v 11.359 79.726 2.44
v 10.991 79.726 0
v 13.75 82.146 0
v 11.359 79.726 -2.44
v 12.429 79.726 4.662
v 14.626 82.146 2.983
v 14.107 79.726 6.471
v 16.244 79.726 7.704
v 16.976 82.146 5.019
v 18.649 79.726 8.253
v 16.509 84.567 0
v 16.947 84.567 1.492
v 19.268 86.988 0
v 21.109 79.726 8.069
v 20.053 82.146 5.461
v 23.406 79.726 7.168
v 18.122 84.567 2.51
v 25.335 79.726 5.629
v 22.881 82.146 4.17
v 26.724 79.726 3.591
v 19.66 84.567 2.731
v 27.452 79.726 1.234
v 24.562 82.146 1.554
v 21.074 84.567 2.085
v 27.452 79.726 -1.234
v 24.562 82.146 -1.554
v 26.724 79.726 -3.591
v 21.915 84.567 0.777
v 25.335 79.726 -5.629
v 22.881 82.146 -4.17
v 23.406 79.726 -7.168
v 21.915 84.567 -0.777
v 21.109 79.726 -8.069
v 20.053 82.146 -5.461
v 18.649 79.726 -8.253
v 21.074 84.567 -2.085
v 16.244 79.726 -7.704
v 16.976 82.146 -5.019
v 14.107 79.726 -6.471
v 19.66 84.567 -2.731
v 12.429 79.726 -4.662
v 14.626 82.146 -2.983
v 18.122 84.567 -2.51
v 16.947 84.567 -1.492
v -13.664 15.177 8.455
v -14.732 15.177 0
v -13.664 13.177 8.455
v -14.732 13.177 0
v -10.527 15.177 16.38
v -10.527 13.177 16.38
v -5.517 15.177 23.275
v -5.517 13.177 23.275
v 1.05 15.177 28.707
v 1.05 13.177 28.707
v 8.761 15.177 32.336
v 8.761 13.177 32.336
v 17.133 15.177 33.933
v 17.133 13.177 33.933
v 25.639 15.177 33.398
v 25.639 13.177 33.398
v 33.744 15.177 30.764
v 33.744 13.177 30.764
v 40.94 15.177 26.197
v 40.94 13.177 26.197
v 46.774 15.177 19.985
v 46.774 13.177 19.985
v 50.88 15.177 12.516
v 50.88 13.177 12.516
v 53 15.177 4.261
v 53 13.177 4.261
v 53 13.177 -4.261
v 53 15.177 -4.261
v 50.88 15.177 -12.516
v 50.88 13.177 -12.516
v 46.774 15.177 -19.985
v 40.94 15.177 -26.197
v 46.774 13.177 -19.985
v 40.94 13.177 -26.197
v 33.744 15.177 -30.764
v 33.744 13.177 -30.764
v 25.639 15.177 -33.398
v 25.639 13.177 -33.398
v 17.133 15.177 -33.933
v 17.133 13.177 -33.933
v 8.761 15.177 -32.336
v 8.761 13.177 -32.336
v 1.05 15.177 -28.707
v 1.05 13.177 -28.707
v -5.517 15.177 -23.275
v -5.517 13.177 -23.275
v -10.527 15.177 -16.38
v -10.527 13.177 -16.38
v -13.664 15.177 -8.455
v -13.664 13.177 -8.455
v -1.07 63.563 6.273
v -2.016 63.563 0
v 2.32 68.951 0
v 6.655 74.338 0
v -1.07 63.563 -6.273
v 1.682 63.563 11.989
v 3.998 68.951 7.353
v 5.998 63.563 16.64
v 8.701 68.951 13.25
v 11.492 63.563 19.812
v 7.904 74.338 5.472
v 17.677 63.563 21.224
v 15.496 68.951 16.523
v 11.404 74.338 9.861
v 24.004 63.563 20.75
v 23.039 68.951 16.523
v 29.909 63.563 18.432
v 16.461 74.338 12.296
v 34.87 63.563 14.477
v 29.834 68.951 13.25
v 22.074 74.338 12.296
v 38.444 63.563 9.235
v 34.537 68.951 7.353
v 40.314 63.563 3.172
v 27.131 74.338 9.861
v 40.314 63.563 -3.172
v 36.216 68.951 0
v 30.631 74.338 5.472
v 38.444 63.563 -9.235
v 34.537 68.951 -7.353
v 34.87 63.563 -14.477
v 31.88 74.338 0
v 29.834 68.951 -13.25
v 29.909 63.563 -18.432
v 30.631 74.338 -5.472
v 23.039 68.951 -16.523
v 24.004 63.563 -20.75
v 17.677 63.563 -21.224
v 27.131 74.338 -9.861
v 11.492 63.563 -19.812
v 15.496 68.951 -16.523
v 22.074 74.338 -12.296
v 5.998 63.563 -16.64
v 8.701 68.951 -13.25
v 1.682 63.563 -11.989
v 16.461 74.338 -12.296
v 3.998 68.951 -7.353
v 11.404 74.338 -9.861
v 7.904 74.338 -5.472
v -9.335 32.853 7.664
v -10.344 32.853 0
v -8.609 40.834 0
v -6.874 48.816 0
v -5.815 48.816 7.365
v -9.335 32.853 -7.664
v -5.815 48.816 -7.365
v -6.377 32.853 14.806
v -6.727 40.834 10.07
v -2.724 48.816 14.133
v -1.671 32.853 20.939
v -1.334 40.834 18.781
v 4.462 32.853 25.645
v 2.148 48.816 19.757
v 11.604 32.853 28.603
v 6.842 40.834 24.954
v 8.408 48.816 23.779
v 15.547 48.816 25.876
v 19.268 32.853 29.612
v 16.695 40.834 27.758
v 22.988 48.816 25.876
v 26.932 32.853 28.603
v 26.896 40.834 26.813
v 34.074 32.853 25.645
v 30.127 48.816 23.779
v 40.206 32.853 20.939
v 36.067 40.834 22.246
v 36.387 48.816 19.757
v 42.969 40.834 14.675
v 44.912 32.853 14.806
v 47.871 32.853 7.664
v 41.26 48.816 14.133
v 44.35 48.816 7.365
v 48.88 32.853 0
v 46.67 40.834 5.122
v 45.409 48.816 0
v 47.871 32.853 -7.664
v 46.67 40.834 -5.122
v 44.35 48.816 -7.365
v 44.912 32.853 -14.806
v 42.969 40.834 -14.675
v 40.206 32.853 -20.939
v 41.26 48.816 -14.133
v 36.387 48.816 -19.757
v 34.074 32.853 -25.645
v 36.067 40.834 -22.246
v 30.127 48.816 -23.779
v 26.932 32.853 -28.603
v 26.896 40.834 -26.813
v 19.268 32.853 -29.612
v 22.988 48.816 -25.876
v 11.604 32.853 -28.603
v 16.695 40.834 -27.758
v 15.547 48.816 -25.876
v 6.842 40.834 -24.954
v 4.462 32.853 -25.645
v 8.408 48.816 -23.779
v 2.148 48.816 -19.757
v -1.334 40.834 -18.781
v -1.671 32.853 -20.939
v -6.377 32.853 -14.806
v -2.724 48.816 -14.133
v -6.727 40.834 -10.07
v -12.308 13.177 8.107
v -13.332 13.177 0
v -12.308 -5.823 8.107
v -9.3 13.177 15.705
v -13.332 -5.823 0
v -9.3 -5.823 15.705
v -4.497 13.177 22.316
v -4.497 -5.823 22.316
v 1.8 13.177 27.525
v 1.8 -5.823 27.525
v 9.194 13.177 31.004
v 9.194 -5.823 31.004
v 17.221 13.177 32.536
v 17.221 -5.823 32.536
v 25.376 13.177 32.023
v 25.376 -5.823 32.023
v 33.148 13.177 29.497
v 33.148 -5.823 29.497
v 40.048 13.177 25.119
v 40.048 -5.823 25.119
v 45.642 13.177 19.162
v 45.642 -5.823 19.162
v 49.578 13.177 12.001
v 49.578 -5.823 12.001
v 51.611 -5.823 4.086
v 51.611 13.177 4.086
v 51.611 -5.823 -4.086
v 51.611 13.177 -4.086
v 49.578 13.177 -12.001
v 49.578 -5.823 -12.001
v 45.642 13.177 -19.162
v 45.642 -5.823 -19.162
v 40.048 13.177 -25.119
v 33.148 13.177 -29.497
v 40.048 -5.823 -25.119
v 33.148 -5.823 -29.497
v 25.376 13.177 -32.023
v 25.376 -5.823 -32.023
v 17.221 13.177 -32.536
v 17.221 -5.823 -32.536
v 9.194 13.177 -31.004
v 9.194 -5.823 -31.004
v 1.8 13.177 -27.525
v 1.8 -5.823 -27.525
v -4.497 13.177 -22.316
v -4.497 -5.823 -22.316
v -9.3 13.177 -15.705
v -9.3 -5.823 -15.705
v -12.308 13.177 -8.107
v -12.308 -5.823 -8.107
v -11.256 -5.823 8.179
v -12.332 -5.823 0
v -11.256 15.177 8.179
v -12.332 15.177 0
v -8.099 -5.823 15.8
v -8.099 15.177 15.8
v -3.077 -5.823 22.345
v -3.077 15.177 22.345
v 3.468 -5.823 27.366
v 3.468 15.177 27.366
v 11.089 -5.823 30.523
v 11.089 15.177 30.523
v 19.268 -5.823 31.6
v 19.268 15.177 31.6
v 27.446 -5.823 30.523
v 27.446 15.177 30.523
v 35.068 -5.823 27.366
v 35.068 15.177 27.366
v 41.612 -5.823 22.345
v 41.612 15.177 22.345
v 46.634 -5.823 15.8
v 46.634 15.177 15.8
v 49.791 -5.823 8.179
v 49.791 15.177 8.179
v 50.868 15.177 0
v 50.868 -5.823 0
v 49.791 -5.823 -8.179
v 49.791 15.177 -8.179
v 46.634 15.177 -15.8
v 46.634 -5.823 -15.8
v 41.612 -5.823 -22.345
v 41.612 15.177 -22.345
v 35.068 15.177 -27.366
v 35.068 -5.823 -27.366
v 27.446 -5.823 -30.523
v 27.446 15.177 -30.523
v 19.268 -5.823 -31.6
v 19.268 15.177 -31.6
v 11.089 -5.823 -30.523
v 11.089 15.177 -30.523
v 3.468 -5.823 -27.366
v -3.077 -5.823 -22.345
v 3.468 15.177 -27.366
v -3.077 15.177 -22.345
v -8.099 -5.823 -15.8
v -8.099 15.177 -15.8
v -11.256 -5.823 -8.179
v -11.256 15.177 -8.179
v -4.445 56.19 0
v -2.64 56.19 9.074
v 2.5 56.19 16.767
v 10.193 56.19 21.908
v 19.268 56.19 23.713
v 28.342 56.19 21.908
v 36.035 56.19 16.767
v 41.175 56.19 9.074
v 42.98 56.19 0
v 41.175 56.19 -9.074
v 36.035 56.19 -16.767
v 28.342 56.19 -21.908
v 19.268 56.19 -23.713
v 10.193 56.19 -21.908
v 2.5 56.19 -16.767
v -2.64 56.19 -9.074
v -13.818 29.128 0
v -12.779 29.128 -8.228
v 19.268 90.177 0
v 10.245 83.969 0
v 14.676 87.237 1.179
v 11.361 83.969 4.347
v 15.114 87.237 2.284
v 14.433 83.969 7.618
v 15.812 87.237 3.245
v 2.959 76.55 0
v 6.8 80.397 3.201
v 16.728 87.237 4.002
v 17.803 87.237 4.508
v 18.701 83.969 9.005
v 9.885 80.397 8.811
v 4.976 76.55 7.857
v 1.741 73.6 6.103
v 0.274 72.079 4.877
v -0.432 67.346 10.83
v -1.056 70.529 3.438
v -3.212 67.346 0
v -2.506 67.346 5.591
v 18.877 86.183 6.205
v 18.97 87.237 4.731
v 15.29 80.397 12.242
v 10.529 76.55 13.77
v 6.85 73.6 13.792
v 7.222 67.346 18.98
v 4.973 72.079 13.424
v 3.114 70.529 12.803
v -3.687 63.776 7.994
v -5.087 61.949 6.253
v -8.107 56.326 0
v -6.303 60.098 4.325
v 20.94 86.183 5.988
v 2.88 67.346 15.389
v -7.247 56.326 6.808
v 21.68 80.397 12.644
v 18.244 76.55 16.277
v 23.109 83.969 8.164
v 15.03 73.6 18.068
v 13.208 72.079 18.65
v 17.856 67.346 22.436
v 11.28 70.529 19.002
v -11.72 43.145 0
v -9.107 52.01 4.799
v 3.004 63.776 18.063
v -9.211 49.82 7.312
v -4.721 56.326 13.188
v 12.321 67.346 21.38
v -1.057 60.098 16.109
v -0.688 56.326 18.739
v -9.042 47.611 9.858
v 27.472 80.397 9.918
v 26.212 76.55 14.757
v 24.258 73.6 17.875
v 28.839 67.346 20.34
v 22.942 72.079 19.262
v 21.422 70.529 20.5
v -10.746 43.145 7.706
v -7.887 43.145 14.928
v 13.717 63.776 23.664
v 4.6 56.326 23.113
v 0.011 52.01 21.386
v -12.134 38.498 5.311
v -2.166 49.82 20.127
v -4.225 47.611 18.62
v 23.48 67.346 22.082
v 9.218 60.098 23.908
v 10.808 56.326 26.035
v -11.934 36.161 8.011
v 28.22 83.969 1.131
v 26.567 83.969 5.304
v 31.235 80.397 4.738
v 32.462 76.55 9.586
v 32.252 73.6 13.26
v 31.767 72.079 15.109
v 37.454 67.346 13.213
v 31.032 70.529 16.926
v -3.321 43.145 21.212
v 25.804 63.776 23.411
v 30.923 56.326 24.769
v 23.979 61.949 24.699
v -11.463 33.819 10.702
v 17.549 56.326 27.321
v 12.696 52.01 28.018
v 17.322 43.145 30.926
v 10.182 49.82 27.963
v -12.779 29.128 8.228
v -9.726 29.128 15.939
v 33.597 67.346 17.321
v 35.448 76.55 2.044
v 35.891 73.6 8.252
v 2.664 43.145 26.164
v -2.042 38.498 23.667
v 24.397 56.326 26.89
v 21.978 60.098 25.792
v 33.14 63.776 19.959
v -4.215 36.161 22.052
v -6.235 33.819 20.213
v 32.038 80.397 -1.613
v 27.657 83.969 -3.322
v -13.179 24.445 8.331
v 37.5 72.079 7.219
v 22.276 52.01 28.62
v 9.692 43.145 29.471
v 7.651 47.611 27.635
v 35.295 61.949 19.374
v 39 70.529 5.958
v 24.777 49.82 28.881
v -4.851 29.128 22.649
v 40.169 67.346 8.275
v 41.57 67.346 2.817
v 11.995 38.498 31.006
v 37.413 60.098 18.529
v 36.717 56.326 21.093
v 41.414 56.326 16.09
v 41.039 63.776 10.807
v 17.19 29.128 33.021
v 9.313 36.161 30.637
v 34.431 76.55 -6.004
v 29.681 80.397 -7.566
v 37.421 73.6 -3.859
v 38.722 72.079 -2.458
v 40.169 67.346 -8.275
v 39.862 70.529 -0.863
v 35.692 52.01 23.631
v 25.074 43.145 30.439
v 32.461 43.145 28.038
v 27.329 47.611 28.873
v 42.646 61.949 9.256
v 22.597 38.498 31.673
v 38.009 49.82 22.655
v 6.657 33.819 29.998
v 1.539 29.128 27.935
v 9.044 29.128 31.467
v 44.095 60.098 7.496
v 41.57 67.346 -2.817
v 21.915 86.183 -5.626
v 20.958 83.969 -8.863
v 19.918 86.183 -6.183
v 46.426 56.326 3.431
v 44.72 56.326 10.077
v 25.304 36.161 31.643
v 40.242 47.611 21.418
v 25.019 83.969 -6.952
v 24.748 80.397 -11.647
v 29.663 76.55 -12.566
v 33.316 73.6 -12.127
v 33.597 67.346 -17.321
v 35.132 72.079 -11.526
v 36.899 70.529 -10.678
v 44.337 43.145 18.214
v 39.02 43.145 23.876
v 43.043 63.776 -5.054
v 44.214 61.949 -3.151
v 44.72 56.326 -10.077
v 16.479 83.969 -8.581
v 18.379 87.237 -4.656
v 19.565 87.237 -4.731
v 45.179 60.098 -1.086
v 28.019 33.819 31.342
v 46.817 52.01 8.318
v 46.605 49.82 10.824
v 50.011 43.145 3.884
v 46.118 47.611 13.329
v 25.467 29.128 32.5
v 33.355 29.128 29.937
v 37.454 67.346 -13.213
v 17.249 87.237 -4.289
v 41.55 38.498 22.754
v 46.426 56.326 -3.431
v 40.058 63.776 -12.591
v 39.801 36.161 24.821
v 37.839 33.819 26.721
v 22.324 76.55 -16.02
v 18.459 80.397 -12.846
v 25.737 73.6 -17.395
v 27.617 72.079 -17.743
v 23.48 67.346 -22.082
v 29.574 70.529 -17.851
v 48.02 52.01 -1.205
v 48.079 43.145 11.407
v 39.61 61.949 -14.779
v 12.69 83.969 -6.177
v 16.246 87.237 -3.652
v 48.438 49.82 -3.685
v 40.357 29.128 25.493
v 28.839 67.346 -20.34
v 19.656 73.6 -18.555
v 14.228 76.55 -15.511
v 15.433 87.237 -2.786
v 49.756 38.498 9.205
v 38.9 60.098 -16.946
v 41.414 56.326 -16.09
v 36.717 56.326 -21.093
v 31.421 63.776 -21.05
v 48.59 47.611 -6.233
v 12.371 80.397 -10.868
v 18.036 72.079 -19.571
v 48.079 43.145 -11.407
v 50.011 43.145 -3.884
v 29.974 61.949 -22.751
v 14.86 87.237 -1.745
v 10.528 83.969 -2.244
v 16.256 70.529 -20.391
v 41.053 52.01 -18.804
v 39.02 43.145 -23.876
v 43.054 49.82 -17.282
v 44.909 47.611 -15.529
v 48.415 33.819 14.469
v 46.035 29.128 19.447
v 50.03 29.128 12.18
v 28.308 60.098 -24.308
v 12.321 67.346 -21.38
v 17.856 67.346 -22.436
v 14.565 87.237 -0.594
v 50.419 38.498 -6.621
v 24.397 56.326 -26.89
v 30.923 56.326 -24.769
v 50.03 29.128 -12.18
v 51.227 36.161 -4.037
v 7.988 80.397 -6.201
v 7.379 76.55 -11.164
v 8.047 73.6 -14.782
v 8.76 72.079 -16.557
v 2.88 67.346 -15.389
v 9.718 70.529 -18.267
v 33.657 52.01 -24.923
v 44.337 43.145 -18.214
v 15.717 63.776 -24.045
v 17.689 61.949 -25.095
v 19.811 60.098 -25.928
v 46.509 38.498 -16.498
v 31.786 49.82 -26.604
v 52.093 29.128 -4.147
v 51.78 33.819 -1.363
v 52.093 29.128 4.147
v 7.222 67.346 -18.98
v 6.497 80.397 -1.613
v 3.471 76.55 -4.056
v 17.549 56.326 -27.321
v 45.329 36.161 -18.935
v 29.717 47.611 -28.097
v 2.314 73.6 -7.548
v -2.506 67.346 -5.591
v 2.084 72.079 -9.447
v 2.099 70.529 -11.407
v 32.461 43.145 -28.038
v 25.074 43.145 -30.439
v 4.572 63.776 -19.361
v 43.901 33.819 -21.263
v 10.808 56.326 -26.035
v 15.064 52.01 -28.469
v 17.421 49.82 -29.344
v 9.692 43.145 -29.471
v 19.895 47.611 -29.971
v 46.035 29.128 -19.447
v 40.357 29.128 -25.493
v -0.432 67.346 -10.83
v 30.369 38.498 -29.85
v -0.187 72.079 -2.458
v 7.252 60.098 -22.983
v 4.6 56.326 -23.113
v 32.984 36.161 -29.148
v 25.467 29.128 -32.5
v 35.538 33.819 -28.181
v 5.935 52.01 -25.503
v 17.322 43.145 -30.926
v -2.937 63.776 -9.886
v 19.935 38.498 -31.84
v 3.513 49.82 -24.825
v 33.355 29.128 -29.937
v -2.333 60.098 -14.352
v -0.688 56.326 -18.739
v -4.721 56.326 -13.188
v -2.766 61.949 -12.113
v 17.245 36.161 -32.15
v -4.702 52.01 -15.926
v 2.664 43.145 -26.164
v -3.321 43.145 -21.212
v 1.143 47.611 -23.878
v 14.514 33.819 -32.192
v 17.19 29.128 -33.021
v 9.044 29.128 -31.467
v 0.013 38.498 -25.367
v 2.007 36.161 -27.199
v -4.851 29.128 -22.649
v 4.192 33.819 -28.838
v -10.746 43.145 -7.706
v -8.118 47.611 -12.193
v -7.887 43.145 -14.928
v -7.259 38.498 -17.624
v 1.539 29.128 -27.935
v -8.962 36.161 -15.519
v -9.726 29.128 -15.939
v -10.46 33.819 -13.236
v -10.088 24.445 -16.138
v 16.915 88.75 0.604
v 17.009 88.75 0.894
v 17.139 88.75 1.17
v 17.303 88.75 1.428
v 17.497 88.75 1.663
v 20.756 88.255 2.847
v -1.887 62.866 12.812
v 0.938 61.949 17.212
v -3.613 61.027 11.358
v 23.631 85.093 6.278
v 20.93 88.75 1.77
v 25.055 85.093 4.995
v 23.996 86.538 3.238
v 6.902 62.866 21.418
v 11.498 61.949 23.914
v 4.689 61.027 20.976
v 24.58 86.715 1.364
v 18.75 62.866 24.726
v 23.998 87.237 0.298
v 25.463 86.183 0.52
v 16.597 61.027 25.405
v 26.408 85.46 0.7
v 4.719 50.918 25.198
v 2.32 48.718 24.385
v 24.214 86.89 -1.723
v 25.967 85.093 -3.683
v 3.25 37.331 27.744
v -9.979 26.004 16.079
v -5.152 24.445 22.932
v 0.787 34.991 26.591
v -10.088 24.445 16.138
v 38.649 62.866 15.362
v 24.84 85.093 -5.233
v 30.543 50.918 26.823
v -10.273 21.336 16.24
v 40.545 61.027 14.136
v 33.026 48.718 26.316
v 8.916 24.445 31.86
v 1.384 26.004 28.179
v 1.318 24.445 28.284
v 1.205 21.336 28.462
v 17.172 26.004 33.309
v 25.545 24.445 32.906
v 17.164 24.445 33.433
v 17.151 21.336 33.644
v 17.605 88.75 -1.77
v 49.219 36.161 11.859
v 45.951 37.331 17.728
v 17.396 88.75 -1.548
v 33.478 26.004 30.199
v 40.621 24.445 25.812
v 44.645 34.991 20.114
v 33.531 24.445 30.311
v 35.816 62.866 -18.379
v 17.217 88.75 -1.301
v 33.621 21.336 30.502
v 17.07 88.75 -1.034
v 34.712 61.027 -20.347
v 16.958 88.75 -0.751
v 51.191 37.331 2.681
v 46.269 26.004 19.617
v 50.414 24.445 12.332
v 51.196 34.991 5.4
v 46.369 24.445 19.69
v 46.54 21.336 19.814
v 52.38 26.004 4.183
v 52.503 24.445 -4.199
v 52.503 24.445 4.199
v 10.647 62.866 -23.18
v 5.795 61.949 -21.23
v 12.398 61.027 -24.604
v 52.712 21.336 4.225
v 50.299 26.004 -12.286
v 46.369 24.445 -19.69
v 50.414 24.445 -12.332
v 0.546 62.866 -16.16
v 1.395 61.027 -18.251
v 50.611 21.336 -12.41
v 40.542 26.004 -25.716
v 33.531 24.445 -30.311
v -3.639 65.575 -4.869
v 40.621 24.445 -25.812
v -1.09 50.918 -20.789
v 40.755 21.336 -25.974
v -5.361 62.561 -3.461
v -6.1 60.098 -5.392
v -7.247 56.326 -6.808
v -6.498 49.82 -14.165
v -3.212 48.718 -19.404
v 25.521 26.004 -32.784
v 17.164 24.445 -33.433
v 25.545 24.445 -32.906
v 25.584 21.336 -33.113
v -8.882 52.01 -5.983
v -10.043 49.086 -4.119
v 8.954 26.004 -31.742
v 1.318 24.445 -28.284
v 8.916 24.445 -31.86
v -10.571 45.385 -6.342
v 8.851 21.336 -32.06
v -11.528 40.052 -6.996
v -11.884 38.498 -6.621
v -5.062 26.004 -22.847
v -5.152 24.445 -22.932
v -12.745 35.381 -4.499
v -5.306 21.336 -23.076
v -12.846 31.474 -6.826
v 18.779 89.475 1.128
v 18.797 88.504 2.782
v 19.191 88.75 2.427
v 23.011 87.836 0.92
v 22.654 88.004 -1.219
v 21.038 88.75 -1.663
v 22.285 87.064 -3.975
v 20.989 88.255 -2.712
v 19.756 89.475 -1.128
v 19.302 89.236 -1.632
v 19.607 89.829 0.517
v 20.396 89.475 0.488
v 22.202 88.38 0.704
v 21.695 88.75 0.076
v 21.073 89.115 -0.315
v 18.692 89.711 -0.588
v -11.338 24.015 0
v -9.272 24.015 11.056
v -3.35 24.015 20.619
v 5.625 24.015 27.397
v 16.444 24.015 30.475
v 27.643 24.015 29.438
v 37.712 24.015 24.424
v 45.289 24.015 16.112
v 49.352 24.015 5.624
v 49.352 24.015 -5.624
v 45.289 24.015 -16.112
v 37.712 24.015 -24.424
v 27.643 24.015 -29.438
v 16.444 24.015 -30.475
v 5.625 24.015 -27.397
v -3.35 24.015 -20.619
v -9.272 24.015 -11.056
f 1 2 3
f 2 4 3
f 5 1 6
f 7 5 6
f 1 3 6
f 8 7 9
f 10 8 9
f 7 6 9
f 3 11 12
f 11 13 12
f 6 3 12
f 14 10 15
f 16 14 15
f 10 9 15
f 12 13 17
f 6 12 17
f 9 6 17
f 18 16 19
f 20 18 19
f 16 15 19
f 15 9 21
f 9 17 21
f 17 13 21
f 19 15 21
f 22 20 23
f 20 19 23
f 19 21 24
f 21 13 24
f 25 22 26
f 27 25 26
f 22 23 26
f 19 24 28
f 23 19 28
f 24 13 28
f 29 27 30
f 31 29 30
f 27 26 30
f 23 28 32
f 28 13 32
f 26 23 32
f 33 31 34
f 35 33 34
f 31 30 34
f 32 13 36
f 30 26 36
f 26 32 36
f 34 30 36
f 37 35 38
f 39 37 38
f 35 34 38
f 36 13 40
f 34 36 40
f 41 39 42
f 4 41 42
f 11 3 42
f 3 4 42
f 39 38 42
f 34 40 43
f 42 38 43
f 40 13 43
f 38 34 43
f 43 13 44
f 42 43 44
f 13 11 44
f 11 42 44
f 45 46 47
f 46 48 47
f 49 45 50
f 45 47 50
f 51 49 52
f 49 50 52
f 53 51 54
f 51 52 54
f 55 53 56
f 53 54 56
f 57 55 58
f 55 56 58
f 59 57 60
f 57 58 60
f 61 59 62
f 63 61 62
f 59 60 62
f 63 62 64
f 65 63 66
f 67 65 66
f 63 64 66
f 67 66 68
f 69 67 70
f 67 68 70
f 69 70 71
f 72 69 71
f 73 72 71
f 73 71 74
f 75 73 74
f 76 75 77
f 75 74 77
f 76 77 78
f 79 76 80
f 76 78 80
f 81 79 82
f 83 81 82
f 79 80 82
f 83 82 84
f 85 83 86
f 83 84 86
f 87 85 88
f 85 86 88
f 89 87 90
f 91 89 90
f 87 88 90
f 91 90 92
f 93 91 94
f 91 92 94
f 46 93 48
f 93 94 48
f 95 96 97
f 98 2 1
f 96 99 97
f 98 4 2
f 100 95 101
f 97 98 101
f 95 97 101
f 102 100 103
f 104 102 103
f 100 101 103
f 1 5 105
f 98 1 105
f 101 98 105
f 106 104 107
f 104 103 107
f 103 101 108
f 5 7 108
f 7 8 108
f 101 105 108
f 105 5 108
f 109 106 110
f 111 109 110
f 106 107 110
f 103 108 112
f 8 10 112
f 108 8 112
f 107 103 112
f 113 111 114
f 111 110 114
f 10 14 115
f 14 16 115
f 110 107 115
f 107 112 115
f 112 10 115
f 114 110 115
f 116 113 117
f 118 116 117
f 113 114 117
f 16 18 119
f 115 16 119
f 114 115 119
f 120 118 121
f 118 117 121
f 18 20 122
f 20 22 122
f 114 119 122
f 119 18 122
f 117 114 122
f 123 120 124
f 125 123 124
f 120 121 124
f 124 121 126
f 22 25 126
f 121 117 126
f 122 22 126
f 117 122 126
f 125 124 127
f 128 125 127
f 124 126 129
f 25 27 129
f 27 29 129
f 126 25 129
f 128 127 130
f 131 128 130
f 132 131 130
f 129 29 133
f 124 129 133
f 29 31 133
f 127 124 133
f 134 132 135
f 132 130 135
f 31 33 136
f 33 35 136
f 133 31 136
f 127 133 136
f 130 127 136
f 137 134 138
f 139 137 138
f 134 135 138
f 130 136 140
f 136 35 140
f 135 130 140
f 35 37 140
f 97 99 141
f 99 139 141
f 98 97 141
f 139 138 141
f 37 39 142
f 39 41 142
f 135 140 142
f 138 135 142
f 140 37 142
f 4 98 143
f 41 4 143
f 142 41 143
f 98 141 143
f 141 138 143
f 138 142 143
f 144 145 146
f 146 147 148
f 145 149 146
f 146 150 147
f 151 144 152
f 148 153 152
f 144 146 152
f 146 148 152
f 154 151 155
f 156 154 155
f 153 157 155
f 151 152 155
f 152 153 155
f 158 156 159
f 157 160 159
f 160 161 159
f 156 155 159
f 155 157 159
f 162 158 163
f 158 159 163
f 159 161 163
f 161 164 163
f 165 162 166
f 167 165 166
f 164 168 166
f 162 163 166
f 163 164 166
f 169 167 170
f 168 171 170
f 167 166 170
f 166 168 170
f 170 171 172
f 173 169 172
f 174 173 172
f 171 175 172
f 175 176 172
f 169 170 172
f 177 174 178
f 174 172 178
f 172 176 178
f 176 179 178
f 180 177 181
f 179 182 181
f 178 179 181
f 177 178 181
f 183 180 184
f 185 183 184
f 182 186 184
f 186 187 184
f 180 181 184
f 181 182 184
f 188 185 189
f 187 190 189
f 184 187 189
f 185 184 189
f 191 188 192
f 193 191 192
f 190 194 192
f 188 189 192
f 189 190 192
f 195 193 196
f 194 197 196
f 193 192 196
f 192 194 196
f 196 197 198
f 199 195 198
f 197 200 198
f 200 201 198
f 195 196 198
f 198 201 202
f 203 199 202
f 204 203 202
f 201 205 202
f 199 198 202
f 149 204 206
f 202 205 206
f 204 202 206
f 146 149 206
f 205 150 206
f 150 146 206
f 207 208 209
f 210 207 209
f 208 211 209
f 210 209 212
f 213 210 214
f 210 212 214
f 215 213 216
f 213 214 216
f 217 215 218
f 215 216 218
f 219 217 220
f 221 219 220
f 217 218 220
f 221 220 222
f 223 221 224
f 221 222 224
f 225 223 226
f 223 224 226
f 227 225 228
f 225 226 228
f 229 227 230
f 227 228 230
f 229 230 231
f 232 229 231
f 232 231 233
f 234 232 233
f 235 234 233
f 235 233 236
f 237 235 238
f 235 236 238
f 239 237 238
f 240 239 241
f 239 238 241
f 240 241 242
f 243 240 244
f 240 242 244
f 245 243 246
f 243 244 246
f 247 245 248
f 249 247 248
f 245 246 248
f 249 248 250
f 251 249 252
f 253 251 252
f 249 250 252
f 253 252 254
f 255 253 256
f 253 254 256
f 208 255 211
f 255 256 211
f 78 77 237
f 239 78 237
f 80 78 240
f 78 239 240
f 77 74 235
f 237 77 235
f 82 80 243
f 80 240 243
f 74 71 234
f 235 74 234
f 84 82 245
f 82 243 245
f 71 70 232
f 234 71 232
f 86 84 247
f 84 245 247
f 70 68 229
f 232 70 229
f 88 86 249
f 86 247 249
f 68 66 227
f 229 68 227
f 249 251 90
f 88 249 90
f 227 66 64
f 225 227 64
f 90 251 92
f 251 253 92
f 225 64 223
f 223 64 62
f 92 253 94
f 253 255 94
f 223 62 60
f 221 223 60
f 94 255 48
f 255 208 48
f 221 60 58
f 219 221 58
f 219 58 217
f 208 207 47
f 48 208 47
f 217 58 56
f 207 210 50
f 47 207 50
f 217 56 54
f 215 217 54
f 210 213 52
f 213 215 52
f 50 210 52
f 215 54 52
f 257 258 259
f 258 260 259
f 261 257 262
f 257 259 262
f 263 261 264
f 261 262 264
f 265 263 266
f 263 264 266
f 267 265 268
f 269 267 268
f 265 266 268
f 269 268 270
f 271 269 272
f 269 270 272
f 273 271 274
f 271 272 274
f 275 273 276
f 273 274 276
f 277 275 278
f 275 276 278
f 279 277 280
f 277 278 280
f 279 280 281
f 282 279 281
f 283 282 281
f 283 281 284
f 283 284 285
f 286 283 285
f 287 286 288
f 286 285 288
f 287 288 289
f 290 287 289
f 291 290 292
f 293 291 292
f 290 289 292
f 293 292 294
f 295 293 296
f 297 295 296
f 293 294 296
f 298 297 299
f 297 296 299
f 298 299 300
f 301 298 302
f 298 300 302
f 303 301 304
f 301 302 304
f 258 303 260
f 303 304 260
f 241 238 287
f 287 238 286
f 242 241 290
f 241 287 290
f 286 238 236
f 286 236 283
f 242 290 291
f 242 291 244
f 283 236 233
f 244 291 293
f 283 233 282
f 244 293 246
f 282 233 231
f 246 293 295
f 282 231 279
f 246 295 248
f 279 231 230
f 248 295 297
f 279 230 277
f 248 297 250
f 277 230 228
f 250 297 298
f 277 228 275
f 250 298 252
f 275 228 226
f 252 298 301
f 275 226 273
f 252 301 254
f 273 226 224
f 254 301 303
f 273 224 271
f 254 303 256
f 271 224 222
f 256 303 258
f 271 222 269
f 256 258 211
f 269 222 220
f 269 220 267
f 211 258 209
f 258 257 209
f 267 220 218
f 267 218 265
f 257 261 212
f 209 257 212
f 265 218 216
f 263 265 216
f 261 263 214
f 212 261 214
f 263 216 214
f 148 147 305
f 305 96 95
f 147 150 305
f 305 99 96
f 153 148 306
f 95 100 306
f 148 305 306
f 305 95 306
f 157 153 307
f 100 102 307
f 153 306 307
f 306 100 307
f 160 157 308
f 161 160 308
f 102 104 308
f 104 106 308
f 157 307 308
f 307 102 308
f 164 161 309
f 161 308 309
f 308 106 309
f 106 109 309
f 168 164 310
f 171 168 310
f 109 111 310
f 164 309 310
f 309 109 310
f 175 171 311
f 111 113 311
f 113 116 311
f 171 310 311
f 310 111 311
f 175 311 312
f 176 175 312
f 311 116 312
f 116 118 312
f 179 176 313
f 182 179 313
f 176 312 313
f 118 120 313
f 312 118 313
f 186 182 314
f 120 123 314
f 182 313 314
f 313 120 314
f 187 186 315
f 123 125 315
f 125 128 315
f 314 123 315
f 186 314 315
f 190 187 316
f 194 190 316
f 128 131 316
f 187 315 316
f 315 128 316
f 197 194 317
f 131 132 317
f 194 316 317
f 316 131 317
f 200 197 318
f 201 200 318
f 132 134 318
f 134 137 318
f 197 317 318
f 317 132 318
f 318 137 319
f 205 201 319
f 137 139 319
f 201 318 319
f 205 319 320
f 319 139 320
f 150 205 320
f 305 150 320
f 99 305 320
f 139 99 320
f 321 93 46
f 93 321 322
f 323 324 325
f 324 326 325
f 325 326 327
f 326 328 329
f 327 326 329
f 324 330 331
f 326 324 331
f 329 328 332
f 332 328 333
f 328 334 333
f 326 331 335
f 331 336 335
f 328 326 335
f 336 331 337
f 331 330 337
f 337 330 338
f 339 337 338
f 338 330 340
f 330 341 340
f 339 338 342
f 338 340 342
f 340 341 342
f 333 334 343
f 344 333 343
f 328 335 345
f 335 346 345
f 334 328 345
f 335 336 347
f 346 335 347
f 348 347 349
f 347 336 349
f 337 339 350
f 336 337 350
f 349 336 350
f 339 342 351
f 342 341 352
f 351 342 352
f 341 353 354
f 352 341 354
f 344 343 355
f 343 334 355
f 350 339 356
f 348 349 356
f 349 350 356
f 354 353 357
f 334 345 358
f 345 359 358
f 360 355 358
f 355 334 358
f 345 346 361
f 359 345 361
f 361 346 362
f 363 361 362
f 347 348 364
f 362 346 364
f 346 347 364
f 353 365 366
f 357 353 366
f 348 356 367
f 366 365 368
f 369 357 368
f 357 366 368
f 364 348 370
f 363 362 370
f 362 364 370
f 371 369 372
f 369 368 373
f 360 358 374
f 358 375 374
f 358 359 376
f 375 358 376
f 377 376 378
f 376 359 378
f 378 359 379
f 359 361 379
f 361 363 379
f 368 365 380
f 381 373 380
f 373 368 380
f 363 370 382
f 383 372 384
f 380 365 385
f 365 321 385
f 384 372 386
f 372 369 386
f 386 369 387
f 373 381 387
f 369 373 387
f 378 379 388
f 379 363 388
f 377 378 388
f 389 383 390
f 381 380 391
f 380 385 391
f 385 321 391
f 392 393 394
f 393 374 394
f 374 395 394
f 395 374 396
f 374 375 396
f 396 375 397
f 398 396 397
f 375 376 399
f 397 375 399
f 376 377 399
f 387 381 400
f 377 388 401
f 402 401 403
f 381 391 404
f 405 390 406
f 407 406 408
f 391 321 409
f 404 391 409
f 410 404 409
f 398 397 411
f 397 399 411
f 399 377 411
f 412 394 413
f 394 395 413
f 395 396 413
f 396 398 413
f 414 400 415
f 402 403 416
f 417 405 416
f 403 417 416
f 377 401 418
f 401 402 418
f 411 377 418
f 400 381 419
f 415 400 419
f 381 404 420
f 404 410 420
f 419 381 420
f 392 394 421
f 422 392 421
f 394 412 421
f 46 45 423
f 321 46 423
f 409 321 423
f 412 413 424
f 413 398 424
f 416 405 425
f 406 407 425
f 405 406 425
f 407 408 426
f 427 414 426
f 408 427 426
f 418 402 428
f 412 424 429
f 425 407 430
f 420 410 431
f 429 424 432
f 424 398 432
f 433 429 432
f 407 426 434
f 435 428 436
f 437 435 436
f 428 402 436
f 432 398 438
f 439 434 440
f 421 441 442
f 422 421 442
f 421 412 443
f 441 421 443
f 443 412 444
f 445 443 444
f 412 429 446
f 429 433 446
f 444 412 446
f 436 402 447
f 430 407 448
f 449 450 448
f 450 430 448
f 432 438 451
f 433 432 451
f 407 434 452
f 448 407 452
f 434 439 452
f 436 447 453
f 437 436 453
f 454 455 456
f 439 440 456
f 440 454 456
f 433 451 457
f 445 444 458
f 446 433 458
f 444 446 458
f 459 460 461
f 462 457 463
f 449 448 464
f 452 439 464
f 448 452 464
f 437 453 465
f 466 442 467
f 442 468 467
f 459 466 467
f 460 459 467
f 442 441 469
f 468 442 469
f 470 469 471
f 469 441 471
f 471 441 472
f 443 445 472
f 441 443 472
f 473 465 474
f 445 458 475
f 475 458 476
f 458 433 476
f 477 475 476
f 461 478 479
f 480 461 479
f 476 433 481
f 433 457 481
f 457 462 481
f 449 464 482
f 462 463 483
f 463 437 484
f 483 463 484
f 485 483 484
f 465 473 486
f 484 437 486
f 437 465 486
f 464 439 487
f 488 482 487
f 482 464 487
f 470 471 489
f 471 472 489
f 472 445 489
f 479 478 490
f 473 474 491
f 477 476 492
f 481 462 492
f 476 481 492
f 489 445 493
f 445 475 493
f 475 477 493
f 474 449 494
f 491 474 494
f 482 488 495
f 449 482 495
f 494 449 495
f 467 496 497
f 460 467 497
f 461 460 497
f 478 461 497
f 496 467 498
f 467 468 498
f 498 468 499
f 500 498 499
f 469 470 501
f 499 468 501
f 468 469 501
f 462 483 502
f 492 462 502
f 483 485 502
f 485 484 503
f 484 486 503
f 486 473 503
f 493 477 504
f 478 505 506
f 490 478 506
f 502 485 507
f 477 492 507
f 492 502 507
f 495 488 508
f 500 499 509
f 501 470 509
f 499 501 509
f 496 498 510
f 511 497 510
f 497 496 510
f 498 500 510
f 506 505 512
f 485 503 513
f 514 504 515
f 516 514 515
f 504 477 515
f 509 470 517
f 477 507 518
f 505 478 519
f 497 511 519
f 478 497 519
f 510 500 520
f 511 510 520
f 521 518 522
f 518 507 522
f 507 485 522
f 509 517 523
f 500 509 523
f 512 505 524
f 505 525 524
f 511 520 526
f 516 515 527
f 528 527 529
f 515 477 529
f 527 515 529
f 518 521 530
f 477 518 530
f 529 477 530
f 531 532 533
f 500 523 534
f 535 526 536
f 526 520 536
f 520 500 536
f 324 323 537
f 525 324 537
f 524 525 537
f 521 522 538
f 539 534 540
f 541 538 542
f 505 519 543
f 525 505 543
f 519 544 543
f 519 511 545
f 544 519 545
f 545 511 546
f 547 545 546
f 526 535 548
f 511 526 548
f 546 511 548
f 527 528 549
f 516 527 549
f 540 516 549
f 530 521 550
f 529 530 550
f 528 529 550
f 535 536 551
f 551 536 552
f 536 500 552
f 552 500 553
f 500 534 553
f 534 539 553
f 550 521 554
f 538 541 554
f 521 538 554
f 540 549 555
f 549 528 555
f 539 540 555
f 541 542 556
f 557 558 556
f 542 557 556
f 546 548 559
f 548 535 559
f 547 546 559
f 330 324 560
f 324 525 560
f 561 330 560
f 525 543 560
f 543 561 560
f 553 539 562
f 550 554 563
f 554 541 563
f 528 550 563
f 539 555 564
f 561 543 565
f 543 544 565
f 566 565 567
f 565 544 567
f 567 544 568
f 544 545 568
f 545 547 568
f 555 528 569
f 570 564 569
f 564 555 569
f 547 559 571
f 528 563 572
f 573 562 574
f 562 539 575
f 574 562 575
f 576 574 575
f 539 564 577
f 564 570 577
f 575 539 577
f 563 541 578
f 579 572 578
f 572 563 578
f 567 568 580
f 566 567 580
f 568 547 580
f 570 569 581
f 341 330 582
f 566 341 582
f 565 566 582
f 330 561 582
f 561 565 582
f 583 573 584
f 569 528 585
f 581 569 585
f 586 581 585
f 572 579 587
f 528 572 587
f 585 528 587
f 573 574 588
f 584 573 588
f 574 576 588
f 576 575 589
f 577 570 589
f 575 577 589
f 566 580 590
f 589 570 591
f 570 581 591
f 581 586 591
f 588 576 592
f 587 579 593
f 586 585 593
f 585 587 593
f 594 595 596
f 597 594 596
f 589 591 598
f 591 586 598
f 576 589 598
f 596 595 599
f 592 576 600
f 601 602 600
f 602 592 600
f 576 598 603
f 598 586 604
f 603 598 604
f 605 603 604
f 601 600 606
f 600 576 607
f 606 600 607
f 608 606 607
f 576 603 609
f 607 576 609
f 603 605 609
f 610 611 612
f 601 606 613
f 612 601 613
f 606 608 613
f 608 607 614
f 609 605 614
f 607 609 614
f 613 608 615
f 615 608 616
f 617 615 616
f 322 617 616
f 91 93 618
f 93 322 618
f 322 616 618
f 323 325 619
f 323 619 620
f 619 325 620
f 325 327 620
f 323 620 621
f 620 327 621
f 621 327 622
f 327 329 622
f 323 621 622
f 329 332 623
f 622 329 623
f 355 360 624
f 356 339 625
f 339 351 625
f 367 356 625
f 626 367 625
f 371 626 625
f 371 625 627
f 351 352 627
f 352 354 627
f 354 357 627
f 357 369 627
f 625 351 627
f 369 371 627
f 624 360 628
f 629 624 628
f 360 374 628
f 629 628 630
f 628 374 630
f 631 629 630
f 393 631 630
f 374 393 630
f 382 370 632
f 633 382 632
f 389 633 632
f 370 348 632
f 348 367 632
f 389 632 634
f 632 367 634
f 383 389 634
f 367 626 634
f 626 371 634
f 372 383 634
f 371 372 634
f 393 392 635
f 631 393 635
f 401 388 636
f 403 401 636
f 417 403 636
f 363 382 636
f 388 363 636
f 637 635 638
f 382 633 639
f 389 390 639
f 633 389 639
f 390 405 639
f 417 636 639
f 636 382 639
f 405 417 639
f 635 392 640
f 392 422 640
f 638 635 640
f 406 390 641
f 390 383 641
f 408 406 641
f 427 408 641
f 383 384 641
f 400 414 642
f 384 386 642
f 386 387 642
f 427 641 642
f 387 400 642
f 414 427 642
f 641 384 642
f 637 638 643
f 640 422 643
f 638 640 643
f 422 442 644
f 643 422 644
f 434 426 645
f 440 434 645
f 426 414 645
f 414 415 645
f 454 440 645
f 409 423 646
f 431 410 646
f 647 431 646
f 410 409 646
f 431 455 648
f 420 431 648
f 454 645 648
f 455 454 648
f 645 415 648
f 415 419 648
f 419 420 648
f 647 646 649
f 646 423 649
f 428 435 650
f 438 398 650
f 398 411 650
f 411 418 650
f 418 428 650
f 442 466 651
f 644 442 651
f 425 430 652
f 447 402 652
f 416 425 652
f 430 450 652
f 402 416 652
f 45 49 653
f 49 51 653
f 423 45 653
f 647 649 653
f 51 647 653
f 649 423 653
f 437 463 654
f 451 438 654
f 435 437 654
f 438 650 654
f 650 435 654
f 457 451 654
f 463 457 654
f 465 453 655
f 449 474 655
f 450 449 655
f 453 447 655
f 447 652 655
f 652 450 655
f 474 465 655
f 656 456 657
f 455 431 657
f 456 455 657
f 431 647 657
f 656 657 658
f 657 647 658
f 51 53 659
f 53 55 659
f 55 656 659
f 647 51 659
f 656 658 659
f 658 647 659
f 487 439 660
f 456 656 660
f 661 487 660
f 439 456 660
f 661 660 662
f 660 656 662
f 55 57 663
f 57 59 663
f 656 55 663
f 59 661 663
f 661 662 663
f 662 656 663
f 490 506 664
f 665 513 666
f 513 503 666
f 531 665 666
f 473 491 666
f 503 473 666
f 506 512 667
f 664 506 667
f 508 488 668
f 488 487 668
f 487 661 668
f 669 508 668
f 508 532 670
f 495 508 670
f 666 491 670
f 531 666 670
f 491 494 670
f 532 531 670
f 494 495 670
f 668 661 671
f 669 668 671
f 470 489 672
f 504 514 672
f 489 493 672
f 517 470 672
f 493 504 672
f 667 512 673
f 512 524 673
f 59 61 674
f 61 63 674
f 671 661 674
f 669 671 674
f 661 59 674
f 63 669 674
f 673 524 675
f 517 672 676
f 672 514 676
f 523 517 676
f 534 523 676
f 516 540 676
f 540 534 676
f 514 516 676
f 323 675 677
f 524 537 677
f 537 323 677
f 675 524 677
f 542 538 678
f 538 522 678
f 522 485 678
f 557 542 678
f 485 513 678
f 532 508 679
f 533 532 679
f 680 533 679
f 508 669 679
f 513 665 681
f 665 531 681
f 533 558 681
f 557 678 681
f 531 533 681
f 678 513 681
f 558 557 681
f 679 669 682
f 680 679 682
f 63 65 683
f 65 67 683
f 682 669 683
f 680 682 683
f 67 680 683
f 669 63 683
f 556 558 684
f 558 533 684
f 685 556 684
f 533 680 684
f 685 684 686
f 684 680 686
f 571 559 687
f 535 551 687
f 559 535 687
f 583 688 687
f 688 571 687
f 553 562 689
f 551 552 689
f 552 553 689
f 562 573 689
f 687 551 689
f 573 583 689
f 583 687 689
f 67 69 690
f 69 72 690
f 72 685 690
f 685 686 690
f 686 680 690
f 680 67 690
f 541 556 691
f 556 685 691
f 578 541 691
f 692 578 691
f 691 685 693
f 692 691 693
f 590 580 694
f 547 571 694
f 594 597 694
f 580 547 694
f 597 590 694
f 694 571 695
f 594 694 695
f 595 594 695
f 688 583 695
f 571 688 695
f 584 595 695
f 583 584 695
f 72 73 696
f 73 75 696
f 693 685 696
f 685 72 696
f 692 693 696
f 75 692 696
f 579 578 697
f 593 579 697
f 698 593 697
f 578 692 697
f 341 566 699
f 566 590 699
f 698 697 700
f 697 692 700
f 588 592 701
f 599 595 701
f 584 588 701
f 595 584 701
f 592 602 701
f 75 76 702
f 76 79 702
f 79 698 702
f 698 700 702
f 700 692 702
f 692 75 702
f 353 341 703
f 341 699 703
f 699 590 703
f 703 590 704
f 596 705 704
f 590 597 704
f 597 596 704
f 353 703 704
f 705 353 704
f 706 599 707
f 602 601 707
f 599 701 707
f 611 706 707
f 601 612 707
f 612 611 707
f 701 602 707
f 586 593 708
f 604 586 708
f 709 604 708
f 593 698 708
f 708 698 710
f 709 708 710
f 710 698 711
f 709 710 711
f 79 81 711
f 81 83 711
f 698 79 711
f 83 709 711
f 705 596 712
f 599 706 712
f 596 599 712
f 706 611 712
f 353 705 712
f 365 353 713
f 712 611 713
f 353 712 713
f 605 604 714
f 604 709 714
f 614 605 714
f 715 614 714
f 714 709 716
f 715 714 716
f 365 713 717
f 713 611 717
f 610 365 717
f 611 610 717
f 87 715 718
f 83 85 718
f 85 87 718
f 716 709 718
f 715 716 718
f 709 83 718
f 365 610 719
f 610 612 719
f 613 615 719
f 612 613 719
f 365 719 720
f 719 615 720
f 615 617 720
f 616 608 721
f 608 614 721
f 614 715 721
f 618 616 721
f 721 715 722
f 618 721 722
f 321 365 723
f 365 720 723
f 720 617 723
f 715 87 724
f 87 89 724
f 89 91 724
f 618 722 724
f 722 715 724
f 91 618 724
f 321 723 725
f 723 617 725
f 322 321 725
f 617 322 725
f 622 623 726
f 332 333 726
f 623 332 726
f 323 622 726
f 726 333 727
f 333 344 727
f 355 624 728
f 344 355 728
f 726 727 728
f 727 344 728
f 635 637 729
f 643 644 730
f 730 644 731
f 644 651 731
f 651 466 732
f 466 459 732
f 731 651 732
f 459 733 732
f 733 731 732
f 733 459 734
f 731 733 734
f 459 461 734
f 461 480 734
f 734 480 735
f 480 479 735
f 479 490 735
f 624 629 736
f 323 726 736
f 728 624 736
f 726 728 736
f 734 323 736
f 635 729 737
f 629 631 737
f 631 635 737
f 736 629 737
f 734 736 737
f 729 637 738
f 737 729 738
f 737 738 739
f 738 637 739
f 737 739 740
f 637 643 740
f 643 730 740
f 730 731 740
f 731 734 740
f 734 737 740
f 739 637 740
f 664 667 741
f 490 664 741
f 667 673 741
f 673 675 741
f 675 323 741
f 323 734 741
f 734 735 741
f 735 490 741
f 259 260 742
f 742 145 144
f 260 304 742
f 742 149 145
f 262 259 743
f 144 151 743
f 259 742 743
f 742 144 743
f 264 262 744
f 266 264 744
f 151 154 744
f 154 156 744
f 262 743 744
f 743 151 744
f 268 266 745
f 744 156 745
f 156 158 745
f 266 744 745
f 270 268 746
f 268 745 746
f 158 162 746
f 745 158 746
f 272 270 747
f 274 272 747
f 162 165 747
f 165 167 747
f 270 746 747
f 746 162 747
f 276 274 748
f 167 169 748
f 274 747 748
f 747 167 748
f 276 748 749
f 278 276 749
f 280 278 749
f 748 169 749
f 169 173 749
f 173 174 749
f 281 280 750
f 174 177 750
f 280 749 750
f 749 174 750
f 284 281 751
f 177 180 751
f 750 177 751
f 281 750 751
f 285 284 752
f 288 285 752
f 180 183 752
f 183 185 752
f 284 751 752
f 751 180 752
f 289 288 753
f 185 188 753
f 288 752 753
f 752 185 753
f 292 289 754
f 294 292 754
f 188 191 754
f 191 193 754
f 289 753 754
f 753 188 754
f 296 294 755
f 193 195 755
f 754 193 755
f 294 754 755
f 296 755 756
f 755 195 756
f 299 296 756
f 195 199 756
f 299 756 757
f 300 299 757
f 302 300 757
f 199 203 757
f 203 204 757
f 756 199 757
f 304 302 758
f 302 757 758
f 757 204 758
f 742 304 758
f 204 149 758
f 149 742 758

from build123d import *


with BuildPart() as part:
    # Sketch1 → Revolve1 (revolve)
    with BuildSketch(Plane.XY):
        with BuildLine():
            Line((-13.332366867, 13.177419355), (-13.332366867, -5.822580645))
            Line((-13.332366867, -5.822580645), (-12.332366867, -5.822580645))
            Line((-12.332366867, -5.822580645), (-12.332366867, 15.177419355))
            Line((-12.332366867, 15.177419355), (-10.344271679, 32.852989069))
            Line((-10.344271679, 32.852989069), (-6.874157706, 48.815513341))
            Line((-6.874157706, 48.815513341), (-2.015998145, 63.563497723))
            Line((-2.015998145, 63.563497723), (10.991173398, 79.725511747))
            Line((10.991173398, 79.725511747), (19.267633133, 86.988176056))
            Line((19.267633133, 86.988176056), (19.267633133, 90.177419355))
            add(Edge.make_bspline(
                [(19.267633133, 90.177419355), (-8.310711892, 74.843338049), (-13.761600321, 43.164318334), (-14.732366867, 15.177419355)],
                knots=[0, 0, 0, 0, 1, 1, 1, 1], degree=3))
            Line((-14.732366867, 15.177419355), (-14.732366867, 13.177419355))
            Line((-14.732366867, 13.177419355), (-13.332366867, 13.177419355))
        make_face()
    revolve(axis=Axis((19.267633133, 86.988176056, 0), (0, 1, 0)))


solid = part.part
